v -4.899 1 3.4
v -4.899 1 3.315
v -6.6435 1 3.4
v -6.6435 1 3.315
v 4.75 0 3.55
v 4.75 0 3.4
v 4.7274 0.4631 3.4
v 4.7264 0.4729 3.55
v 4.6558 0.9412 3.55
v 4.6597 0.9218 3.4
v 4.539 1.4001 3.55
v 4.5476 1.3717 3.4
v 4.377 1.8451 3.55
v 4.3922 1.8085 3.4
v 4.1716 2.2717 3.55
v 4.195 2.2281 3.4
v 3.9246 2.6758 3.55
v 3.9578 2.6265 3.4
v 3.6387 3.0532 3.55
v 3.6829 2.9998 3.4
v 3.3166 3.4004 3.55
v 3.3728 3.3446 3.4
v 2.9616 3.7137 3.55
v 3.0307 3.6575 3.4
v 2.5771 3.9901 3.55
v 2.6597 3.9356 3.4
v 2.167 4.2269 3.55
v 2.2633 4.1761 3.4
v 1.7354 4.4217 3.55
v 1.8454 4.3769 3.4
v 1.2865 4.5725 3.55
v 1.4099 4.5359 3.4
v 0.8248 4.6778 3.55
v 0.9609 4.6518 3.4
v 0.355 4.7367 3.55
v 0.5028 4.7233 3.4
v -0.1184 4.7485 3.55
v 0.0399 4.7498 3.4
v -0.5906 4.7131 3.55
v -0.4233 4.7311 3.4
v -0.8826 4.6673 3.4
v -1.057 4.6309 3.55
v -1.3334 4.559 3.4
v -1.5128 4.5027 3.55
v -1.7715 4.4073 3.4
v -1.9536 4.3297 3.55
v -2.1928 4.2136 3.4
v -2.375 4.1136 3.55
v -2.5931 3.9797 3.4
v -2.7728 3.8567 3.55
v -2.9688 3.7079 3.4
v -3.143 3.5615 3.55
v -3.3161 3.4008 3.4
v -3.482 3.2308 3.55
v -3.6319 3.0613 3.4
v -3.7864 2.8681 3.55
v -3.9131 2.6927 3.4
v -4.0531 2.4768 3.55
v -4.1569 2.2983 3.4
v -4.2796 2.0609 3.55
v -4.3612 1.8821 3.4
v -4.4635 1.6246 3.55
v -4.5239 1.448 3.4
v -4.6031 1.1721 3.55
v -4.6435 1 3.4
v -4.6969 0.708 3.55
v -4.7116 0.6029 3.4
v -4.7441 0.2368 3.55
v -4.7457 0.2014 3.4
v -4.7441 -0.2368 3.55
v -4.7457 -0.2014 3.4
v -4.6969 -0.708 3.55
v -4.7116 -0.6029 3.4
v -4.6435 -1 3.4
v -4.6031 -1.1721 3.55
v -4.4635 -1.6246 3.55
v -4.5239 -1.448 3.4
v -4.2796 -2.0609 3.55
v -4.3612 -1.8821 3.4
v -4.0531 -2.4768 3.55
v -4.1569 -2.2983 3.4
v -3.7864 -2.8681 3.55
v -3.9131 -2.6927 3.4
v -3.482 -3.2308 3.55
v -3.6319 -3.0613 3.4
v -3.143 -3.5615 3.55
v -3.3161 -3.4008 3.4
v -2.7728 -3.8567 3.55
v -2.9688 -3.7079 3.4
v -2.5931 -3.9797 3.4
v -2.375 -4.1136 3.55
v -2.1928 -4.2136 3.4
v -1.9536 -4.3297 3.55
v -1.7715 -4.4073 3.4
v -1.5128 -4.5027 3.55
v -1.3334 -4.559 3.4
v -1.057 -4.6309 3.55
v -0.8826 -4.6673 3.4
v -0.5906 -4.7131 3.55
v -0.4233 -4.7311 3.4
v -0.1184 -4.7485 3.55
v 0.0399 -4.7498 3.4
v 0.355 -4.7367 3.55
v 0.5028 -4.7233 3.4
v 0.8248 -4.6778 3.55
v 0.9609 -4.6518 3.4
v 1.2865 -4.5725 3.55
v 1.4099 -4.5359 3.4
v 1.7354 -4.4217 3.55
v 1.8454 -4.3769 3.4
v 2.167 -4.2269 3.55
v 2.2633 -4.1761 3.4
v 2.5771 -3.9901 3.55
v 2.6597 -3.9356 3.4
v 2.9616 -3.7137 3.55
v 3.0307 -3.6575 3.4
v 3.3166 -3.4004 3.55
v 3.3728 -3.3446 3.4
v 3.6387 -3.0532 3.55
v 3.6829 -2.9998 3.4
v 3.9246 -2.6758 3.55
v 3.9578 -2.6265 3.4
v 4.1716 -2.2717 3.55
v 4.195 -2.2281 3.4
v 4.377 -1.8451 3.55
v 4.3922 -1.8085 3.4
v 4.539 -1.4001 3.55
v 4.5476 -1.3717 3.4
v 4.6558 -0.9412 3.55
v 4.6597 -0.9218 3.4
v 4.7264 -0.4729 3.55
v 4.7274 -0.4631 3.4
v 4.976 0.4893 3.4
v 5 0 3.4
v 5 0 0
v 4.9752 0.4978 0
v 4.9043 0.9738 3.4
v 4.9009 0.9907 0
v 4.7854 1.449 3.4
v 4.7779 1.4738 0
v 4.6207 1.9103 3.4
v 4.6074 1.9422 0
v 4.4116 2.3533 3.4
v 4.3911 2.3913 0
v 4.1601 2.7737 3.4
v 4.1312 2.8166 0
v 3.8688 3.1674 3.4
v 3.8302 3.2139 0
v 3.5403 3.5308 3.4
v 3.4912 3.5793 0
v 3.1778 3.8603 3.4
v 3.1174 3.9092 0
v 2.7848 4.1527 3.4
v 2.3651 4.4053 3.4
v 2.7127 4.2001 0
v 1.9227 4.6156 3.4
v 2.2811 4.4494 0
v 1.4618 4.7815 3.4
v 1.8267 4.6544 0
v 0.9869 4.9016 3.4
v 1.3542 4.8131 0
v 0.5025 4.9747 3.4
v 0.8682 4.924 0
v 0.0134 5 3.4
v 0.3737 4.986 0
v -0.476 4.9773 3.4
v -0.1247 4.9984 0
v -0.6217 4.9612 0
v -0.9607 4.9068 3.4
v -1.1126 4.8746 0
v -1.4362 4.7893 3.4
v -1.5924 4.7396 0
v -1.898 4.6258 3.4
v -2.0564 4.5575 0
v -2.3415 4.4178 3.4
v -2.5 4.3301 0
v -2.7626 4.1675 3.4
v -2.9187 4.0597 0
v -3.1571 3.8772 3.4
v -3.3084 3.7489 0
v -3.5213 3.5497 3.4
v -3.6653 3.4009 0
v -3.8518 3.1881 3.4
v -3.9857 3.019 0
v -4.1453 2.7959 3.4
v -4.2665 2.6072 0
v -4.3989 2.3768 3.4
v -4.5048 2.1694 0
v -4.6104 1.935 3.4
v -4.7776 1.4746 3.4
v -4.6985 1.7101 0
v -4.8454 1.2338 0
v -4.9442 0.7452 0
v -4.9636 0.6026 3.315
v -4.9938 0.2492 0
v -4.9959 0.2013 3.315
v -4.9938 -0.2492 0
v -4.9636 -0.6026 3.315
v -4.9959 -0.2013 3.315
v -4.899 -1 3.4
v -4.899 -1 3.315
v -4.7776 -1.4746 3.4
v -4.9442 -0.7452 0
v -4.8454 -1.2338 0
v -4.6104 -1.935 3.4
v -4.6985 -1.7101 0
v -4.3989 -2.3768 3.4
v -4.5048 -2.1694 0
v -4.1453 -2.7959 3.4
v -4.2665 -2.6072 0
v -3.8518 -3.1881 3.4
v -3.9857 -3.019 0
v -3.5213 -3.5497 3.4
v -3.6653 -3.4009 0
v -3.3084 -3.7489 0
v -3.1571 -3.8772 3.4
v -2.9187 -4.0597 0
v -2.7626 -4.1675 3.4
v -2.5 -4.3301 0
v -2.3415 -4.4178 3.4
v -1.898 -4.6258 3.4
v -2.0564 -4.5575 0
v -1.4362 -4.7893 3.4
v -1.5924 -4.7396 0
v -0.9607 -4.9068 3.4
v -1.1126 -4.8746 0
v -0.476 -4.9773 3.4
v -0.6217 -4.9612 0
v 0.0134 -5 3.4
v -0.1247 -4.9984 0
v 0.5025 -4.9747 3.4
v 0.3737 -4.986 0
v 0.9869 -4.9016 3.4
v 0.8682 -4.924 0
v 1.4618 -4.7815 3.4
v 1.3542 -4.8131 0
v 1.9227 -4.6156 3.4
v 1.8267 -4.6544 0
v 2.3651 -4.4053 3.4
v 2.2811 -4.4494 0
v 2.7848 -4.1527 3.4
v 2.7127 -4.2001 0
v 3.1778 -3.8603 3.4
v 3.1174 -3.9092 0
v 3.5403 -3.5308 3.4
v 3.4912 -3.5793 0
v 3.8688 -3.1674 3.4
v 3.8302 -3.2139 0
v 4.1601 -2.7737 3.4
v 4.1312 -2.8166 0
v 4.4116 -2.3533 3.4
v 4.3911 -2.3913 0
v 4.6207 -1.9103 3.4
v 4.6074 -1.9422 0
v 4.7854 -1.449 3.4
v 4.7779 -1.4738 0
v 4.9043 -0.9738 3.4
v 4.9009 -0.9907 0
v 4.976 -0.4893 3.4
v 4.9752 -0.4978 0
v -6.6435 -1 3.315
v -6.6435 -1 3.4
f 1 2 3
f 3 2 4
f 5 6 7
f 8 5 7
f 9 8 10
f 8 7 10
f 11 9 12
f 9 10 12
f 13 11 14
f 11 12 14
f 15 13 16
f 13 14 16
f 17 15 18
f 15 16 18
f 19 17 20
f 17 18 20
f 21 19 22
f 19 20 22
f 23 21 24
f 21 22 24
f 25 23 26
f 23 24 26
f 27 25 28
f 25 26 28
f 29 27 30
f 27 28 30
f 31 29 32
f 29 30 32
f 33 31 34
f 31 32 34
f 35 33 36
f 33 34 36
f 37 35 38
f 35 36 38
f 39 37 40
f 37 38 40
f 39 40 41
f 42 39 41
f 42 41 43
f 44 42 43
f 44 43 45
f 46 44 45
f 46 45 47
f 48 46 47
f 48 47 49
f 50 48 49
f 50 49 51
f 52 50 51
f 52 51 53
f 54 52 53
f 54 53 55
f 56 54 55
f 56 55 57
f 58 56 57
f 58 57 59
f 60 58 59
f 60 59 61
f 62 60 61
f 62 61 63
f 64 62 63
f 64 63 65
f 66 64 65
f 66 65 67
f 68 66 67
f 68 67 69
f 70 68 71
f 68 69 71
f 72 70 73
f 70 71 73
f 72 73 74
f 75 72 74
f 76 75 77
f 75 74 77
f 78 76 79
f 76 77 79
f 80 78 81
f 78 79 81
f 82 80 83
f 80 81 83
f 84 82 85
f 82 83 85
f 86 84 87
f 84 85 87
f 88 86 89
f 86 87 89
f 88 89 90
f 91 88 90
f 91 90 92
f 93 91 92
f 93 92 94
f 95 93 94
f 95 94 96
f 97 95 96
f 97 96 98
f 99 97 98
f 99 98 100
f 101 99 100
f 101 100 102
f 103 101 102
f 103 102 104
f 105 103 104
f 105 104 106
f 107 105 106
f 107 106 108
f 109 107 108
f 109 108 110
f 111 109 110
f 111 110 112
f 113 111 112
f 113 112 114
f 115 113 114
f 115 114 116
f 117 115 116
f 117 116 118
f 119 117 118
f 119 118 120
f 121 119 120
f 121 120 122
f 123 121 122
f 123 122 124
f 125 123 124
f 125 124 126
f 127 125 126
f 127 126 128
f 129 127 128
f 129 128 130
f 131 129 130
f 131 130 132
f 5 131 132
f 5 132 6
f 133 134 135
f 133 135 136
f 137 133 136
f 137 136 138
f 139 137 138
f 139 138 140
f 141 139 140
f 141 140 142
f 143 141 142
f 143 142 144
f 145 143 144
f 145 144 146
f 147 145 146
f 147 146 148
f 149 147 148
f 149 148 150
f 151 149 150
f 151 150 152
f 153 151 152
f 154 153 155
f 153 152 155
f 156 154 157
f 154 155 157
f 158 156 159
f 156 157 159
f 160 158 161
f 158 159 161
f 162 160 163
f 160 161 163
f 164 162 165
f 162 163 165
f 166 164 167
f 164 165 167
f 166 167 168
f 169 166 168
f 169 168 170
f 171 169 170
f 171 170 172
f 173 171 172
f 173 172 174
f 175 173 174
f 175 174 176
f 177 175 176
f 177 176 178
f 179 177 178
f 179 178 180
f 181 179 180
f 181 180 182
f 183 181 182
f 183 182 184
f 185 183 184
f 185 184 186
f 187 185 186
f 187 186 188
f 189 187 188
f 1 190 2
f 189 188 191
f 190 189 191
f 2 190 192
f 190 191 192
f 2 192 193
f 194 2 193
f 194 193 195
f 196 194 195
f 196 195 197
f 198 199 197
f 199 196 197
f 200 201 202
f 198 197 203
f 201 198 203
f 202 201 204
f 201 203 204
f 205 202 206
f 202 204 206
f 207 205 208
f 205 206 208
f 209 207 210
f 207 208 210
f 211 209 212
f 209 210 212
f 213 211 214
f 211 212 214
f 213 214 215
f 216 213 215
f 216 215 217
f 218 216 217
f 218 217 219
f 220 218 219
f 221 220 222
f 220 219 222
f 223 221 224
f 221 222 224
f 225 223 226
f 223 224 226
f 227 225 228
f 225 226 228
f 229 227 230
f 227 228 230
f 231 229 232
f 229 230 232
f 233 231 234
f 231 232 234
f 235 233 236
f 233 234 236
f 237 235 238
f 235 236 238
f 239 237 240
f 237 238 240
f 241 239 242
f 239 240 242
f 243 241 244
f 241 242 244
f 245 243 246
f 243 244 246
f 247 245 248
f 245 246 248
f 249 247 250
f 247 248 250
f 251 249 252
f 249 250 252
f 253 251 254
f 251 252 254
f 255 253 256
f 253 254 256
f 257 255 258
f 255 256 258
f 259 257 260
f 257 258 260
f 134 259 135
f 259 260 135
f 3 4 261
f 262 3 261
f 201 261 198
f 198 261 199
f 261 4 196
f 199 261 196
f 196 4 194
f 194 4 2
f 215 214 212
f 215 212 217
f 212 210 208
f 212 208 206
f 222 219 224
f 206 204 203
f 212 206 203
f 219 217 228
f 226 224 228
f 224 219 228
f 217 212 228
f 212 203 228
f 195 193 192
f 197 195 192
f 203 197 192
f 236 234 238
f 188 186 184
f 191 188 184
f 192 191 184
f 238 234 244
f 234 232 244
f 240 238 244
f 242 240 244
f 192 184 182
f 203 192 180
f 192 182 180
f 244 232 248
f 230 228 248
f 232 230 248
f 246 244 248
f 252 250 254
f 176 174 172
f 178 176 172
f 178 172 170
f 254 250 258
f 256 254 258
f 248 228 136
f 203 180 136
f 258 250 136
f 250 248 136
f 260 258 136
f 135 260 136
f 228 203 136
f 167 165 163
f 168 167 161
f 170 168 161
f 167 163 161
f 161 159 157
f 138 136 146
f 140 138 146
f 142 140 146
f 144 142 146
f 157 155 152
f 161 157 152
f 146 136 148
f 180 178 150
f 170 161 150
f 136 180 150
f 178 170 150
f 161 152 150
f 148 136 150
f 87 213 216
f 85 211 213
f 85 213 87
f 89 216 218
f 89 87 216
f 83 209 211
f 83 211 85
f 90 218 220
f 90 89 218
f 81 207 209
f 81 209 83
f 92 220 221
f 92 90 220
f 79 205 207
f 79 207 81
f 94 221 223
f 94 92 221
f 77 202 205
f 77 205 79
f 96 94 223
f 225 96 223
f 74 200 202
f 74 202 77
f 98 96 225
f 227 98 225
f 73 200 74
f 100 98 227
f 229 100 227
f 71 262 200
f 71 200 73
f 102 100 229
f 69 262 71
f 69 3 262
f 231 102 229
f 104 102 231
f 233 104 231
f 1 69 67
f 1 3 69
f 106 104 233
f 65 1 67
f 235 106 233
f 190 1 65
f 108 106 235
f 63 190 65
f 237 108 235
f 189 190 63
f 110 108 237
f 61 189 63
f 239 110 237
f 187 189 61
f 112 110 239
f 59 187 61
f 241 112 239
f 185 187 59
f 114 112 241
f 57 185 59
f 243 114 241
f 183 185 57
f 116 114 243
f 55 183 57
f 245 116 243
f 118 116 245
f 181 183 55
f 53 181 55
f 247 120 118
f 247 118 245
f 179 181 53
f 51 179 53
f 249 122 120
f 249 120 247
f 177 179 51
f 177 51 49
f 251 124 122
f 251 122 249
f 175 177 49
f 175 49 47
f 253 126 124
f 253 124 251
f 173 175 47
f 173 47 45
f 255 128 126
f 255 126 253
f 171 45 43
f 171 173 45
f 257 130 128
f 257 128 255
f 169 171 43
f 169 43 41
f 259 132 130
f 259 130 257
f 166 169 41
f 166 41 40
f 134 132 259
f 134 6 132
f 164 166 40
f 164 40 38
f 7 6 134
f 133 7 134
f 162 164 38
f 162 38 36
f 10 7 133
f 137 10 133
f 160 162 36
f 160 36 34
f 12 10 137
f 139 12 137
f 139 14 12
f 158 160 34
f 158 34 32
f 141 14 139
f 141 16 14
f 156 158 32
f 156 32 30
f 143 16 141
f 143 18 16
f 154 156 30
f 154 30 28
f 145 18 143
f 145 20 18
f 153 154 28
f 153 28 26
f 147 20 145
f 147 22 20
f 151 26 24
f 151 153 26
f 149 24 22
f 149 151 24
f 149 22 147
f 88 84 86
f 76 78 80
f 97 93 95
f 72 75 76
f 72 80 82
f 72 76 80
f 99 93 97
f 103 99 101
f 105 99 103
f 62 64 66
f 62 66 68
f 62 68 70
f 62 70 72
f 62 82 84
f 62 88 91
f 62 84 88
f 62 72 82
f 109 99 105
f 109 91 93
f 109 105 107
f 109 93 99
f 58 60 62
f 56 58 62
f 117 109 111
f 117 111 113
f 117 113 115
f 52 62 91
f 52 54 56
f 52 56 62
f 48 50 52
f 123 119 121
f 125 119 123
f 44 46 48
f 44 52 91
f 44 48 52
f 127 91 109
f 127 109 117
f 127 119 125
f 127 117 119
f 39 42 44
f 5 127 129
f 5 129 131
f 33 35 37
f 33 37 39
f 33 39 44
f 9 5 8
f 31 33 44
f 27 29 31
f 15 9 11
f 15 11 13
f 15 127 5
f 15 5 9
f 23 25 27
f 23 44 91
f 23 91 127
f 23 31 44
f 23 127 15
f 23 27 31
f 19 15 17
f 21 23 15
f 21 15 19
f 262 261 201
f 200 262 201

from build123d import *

# Parameters (mm, degrees)
SKETCH1_R           = 5
BOSS_EXTRUDE1_DEPTH = 3.4
SKETCH2_R           = 4.75
BOSS_EXTRUDE2_DEPTH = 0.15
BOSS_EXTRUDE3_START = -0.085
BOSS_EXTRUDE3_DEPTH = 0.085


with BuildPart() as part:
    # Sketch1 → Boss-Extrude1 (new body)
    with BuildSketch(Plane.XY):
        Circle(SKETCH1_R)
    extrude(amount=BOSS_EXTRUDE1_DEPTH)

    # Sketch2 → Boss-Extrude2 (add)
    with BuildSketch(Plane.XY.offset(3.4)):
        Circle(SKETCH2_R)
    extrude(amount=BOSS_EXTRUDE2_DEPTH)

    # Sketch4 → Boss-Extrude3 (add)
    with BuildSketch(Plane.XY.offset(3.4).offset(BOSS_EXTRUDE3_START)):
        with BuildLine():
            Line((-4.643543905, 1), (-6.643543905, 1))
            Line((-6.643543905, 1), (-6.643543905, -1))
            Line((-6.643543905, -1), (-4.643543905, -1))
            ThreePointArc((-4.643543905, -1), (-4.75, 0), (-4.643543905, 1))
        make_face()
    extrude(amount=BOSS_EXTRUDE3_DEPTH)


solid = part.part
